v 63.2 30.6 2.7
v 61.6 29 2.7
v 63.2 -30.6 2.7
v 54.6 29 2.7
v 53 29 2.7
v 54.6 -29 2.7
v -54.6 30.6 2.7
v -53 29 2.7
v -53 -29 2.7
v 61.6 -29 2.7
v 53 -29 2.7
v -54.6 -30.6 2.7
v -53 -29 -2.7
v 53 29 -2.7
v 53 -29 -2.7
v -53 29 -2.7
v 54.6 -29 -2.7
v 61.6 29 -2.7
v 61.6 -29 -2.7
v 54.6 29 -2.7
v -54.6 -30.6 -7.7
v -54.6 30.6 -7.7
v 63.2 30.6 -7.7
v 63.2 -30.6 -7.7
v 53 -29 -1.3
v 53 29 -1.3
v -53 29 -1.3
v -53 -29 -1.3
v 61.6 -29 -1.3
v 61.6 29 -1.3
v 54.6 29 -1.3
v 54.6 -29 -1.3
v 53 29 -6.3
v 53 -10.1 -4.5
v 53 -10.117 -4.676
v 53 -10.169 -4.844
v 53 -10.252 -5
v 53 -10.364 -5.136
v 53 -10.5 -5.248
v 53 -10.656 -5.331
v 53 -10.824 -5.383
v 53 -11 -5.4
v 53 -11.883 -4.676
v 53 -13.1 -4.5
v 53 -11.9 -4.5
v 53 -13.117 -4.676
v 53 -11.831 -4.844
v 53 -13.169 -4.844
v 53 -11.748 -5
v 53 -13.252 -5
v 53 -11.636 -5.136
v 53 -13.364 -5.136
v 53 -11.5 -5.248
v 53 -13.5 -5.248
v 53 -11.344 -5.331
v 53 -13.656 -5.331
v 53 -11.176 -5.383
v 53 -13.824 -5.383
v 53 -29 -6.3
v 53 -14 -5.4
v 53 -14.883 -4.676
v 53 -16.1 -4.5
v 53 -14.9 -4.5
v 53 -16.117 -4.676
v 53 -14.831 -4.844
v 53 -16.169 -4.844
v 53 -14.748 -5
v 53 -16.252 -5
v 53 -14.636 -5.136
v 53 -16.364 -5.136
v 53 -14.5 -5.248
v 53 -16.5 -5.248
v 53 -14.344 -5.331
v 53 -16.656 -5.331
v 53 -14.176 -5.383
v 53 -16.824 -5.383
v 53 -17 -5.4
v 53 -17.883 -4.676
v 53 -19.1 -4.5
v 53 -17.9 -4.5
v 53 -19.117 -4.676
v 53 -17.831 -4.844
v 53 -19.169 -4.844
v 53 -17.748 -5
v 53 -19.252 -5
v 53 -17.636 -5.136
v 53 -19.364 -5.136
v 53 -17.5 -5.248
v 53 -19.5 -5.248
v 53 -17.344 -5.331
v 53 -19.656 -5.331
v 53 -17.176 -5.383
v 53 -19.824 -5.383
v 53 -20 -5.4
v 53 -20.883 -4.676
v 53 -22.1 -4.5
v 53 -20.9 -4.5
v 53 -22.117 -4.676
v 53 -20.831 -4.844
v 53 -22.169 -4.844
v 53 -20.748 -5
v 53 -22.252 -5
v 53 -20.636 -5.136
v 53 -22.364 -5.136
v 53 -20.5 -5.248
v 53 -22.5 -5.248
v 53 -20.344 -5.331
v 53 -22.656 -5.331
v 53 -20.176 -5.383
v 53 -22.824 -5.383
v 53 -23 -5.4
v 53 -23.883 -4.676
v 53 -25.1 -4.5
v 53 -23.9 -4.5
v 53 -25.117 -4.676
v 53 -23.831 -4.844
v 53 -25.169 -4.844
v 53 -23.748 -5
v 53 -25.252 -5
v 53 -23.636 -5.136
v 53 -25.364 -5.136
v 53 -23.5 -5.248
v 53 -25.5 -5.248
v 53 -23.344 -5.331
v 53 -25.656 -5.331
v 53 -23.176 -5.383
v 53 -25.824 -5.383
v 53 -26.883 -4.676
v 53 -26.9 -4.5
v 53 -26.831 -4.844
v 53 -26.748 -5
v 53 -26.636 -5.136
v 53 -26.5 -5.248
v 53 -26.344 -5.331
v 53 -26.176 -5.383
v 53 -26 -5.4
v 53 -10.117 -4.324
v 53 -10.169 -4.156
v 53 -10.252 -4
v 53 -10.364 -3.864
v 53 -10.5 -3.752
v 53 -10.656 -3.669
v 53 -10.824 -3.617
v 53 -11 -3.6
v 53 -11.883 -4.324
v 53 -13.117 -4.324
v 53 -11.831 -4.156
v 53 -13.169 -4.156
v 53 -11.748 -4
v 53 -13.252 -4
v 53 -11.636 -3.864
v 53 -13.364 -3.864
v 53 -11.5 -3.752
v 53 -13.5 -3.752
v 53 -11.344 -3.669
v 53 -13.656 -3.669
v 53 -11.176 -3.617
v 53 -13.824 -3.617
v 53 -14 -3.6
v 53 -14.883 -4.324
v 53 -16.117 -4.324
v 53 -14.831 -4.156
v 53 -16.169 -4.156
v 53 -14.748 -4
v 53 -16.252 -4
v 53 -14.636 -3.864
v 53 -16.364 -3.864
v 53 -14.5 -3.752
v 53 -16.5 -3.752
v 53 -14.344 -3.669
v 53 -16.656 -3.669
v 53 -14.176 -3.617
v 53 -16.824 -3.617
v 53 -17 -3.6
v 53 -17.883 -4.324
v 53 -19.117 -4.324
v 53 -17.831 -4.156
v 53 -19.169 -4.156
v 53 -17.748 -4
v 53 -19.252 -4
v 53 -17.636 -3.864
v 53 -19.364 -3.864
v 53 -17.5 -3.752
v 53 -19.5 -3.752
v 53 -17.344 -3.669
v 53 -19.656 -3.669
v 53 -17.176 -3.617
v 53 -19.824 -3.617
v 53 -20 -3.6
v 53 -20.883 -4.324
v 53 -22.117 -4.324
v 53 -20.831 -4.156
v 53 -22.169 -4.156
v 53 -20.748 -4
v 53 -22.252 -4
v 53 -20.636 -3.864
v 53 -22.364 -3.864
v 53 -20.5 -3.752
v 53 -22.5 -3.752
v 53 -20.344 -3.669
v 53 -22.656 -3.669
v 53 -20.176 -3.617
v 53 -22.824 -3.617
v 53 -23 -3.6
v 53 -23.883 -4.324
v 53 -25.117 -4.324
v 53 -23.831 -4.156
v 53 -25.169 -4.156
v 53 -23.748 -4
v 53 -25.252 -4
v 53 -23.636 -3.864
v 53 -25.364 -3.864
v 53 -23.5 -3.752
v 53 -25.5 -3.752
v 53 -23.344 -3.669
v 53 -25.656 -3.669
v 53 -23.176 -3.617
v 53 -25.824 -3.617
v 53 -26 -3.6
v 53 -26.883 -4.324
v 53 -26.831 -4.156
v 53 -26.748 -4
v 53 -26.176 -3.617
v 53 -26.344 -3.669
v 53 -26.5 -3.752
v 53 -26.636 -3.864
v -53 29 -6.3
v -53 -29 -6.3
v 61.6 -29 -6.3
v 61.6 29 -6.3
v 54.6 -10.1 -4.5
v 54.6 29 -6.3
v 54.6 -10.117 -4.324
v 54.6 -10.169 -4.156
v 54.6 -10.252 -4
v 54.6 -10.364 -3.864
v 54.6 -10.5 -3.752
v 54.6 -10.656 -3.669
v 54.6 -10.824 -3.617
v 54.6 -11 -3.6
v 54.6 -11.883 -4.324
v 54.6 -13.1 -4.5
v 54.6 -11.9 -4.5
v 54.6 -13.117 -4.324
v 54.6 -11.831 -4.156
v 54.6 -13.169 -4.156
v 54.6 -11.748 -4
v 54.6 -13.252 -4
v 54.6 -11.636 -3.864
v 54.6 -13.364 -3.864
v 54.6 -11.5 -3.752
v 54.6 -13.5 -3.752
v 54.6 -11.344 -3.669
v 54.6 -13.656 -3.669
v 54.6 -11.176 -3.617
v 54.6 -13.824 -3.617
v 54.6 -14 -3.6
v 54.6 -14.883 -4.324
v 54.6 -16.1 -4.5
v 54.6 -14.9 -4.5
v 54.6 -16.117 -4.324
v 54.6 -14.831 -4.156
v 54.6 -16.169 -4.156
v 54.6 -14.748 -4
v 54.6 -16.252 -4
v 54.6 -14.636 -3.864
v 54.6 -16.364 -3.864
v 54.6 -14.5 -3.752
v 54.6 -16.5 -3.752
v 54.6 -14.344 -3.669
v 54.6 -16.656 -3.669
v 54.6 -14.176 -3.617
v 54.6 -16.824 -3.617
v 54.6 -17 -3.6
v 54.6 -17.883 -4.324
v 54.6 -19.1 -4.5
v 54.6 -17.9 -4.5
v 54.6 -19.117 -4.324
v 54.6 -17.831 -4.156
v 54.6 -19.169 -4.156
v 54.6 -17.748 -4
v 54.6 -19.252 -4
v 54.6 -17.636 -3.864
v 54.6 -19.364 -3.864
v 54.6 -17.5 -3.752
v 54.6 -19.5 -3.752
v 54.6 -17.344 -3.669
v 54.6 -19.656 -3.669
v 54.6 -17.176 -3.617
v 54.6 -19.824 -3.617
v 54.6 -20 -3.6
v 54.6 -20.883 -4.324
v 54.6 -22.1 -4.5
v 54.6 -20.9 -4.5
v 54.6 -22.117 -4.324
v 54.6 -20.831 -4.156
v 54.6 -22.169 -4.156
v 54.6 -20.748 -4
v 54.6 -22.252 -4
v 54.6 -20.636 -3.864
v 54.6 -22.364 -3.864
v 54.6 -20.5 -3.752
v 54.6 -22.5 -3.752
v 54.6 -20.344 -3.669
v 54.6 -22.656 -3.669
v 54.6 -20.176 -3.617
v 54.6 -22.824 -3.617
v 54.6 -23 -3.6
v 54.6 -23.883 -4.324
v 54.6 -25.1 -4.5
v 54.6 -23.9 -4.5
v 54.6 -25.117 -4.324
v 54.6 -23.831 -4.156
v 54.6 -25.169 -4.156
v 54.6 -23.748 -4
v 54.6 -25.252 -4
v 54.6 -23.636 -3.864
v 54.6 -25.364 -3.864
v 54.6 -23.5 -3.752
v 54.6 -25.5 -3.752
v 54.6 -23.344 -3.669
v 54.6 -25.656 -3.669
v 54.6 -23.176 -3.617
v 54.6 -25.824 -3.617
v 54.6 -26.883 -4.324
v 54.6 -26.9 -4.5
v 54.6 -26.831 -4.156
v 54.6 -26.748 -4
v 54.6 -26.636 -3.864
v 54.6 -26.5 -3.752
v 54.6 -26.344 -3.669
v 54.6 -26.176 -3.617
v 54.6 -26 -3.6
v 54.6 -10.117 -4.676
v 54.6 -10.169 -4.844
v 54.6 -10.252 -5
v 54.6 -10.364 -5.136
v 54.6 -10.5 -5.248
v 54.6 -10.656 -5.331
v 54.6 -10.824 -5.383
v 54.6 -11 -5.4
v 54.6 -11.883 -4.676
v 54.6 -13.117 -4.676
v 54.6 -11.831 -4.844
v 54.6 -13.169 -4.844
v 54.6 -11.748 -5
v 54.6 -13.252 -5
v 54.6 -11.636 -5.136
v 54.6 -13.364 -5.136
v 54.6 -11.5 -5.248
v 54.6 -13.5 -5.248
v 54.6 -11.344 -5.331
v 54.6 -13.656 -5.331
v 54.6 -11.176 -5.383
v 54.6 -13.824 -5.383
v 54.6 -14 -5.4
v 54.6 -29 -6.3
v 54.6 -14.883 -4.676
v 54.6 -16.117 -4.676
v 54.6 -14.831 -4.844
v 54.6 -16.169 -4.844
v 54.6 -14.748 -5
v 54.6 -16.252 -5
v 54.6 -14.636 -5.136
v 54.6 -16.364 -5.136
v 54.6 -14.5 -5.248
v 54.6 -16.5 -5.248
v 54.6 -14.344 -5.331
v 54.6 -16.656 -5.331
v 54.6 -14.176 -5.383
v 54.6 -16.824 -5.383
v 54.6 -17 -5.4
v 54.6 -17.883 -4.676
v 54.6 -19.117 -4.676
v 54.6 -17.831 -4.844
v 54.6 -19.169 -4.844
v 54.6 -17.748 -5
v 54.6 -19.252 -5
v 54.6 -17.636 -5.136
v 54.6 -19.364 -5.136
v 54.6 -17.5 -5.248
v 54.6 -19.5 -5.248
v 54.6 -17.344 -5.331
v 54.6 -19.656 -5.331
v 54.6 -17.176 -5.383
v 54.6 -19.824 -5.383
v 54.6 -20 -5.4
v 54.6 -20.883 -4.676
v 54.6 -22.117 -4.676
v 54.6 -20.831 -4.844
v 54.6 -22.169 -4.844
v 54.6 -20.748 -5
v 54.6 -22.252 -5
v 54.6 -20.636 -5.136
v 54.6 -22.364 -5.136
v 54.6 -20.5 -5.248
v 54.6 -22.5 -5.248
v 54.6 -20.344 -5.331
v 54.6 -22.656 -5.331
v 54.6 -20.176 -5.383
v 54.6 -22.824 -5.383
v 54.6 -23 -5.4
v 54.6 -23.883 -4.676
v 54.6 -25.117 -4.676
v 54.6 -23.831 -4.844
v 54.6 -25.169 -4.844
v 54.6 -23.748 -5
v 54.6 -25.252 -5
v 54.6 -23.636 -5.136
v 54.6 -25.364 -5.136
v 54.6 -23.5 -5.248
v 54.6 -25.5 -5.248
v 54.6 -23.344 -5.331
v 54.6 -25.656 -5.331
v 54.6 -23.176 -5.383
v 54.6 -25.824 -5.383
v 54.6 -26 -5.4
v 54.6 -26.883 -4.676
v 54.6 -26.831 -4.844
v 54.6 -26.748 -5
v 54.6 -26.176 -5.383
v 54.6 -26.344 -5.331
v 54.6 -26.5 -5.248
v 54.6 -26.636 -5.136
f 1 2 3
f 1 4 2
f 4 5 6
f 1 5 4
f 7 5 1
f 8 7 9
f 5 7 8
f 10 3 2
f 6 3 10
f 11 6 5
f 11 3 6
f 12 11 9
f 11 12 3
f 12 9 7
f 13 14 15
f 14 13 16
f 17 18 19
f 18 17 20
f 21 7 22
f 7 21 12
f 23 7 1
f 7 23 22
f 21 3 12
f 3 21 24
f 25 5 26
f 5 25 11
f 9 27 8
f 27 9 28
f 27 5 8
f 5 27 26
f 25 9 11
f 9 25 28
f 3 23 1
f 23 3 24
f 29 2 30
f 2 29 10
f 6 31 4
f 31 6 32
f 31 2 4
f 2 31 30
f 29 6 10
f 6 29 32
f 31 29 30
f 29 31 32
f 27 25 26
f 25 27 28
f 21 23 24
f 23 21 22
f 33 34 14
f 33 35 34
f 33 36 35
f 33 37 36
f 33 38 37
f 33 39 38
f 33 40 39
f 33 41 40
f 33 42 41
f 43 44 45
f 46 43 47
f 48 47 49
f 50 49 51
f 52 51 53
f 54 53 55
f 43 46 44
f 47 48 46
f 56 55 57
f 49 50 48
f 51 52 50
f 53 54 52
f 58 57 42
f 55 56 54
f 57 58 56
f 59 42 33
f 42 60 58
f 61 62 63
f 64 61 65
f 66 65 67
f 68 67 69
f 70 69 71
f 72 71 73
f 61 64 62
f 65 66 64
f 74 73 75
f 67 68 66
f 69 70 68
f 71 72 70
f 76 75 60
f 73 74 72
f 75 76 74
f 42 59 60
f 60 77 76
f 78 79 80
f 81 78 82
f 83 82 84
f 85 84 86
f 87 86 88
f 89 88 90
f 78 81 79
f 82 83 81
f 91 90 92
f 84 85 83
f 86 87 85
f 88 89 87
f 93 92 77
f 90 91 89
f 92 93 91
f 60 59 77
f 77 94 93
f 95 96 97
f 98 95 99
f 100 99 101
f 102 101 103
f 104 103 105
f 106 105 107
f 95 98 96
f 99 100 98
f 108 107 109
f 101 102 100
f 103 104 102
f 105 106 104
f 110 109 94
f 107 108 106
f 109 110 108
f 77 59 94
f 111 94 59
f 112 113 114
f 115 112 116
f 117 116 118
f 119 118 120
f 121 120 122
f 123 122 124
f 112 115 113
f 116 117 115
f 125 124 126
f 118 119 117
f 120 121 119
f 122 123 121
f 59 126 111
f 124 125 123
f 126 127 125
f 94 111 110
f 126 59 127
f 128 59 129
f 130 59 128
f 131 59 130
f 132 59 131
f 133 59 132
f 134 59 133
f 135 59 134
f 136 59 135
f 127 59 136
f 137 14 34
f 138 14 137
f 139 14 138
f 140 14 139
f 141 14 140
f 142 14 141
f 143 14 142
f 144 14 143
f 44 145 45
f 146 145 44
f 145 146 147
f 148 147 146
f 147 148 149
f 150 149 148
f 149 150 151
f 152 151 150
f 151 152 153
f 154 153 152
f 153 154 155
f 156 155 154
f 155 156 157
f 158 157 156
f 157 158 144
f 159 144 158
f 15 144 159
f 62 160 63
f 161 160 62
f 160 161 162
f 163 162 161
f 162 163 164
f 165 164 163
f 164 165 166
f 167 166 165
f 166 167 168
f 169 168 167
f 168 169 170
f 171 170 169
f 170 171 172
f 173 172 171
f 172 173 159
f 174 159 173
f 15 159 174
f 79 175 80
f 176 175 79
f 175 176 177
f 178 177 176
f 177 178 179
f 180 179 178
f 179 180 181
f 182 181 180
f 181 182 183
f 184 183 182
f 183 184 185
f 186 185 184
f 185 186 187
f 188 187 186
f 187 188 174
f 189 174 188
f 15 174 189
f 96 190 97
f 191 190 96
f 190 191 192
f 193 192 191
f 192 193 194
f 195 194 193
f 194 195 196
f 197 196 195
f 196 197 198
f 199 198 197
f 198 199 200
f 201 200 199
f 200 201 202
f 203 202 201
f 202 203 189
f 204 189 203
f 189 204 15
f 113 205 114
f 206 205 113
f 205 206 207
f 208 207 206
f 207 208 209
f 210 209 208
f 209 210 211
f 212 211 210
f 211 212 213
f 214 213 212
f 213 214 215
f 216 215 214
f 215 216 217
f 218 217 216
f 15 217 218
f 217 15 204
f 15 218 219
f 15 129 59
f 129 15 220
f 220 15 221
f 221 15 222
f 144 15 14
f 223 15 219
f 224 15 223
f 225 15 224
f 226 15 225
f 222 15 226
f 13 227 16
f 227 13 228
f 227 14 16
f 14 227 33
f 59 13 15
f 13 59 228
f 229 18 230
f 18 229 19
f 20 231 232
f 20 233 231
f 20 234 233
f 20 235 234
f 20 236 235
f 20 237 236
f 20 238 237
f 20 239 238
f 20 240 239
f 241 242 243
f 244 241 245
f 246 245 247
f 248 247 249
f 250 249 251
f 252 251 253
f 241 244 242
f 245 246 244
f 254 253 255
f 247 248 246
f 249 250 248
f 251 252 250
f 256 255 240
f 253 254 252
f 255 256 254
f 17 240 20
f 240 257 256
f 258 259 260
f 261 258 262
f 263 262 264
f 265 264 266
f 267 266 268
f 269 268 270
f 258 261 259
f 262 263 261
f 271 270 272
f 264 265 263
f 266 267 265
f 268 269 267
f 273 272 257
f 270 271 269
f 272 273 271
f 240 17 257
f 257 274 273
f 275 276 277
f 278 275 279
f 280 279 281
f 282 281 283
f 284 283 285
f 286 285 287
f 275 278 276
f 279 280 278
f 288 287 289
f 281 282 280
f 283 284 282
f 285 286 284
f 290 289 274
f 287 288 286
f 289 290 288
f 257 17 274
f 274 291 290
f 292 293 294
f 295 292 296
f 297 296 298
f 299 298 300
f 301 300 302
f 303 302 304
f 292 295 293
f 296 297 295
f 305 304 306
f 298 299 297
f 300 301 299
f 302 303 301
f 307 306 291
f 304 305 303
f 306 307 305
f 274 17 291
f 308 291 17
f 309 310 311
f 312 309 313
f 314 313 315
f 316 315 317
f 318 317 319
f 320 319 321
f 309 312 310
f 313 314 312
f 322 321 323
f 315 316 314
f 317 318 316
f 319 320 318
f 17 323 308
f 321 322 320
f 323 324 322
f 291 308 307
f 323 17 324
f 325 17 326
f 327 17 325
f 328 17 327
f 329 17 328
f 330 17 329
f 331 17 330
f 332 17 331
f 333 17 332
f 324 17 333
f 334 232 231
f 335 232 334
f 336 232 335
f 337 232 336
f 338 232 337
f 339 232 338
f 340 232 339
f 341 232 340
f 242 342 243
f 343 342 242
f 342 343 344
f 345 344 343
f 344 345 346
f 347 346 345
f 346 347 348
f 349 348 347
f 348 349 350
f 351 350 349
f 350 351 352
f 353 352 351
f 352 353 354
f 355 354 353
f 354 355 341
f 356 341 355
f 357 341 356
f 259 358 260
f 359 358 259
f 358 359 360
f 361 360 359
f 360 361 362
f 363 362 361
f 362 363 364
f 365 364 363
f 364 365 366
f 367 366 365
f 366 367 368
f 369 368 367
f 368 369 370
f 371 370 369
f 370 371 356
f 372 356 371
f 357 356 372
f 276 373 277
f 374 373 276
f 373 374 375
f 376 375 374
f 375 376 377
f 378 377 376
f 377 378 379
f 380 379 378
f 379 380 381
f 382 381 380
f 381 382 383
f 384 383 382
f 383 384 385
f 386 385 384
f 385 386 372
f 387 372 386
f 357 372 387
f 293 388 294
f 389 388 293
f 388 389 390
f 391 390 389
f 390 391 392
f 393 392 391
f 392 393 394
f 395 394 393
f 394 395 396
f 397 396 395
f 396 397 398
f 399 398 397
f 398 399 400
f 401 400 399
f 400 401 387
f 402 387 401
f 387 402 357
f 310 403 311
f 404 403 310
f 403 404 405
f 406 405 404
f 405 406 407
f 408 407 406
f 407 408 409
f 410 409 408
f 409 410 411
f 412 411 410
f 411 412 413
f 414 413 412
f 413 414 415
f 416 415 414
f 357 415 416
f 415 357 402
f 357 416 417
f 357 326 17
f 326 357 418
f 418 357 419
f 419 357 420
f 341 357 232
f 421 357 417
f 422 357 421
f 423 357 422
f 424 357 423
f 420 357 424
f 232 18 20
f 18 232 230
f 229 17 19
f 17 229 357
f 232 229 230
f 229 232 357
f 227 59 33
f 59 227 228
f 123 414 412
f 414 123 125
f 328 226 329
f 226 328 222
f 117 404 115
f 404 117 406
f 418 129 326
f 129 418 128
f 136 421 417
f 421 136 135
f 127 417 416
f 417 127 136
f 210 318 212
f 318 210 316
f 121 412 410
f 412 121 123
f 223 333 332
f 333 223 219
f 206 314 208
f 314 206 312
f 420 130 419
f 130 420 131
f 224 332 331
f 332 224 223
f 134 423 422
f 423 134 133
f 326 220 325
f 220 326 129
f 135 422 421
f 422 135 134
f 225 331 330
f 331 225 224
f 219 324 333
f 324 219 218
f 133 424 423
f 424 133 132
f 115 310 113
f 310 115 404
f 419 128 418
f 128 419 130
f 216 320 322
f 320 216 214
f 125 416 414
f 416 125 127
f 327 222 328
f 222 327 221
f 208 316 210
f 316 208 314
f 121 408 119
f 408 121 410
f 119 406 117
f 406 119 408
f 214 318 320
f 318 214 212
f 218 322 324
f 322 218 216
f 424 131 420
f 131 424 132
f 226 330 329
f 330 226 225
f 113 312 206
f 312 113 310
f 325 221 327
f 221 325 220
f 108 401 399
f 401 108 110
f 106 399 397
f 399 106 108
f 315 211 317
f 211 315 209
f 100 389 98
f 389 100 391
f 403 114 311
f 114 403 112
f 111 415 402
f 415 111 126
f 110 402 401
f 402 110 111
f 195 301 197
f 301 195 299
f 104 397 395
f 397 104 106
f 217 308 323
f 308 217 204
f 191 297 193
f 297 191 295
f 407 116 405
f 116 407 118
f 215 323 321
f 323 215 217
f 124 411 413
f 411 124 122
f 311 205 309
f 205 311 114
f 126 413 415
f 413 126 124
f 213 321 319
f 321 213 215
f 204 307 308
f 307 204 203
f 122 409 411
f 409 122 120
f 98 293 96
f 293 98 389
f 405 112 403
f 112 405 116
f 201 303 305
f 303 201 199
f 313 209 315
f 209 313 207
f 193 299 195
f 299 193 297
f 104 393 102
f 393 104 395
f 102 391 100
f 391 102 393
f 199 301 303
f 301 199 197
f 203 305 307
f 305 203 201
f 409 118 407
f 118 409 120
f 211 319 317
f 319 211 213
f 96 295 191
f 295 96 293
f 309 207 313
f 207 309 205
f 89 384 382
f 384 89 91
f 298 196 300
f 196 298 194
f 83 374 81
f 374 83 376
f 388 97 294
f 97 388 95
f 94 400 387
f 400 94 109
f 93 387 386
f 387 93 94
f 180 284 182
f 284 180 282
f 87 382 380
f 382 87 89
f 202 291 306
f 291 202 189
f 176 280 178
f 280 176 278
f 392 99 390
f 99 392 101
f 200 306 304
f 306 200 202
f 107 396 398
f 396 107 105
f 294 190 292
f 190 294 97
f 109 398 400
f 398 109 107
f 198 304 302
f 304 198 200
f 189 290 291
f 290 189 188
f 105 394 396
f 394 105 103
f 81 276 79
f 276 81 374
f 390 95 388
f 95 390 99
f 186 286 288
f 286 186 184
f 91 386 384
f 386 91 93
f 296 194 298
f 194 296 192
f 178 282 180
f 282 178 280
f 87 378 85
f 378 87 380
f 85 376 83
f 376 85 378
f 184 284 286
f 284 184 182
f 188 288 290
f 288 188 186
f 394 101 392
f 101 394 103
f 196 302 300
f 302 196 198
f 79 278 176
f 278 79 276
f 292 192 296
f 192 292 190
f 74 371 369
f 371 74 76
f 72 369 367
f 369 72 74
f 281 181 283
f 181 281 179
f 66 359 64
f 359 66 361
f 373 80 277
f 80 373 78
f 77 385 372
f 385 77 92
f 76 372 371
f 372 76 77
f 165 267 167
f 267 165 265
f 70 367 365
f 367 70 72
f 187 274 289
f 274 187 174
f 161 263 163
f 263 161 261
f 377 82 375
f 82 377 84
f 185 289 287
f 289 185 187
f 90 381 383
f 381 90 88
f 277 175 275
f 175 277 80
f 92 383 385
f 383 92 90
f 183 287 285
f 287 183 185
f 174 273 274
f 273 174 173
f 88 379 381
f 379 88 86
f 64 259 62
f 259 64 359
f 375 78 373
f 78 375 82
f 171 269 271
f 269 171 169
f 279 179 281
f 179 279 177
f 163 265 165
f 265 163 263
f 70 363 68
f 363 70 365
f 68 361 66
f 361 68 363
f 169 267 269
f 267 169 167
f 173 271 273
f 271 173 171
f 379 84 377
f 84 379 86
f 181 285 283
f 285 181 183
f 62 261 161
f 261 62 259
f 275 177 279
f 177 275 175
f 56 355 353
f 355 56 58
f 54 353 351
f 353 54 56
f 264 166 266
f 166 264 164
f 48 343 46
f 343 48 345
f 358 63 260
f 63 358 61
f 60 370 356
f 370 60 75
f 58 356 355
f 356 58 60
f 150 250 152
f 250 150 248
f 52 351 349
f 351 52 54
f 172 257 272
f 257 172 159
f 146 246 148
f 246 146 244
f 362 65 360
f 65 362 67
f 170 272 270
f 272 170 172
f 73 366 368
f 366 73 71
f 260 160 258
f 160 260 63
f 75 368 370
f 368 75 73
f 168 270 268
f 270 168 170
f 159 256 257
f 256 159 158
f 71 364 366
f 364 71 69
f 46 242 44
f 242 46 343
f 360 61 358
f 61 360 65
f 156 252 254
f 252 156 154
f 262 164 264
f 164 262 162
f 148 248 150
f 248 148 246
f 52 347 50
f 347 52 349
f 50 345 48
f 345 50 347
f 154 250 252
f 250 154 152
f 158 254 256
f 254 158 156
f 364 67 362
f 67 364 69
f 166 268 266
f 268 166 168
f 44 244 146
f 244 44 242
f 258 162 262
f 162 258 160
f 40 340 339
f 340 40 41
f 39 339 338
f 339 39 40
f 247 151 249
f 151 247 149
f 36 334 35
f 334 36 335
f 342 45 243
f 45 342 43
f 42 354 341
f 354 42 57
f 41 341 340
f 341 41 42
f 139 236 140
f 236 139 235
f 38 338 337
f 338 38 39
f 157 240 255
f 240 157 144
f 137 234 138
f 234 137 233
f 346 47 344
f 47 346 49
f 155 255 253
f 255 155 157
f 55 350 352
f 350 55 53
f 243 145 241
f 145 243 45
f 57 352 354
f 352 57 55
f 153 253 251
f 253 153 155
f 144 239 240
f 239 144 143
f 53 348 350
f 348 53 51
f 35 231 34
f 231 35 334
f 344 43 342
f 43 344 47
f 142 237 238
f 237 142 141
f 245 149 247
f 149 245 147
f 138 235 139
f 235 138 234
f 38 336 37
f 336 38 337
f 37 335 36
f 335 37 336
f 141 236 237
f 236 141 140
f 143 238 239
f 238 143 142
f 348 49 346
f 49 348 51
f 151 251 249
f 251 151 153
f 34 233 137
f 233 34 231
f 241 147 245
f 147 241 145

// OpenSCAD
len_bottom = 106;
depth_bottom = 58;
thickness_walls = 1.6;
// screen backlight panel
// height of frame without thickness bottom
height_frame = 4;
thickness_bottom = 1.4;
depth_pcb = 7; 

// window_frame();

translate([0, 0, -5])
kit_frame();
set_frame();
// frame_is_match();

module window_frame() {
  difference() {
    color("green")
    cube([len_bottom, depth_bottom, height_frame], true);
    cube([len_bottom-10, depth_bottom-4, height_frame+1], true);
    translate([len_bottom/2-1, 0, 0])
    cube([4, depth_bottom-4, height_frame+1], true);
    translate([-len_bottom/2+4, 0, 0])
    cube([4, depth_bottom-4, height_frame+1], true);
  }
}

module kit_frame() {
  difference() {
    set_frame();
    for(i=[1:6]){
      translate([len_bottom/2, -depth_bottom/2+3*i, 0.5])
      rotate([0, 90, 0])
      cylinder(d=1.8, h=5, center=true, $fn=32);
    }

  }  
}

module set_frame() {
  color("lime")
  translate([0, 0, -height_frame/2])
  bottom();
  frame();
  translate([len_bottom/2+depth_pcb/2+thickness_walls, 0, 0])
  set_frame_pcb();
}

module set_frame_pcb() {
  color("lime")
  translate([0, 0, -height_frame/2])
  bottom_pcb();
  frame_pcb();
}

module bottom_pcb() {
  cube([depth_pcb+2*thickness_walls, depth_bottom+2*thickness_walls, thickness_bottom], true);
}

module frame_pcb() {
  difference() {
    cube([depth_pcb+2*thickness_walls, depth_bottom+2*thickness_walls, thickness_bottom+height_frame], true);
    color("red")
    cube([depth_pcb, depth_bottom, thickness_bottom+height_frame+0.1], true);
  }
}

module bottom() {
  cube([len_bottom+2*thickness_walls, depth_bottom+2*thickness_walls, thickness_bottom], true);
}

module frame() {
  difference() {
    cube([len_bottom+2*thickness_walls, depth_bottom+2*thickness_walls, thickness_bottom+height_frame], true);
    color("red")
    cube([len_bottom, depth_bottom, thickness_bottom+height_frame+0.1], true);
  }
}

module frame_is_match() {
  difference() {
    set_frame();
    // cut is match
    translate([106/4, 0, 0])
    cube([106/2+4, 58+4, 4*2], true);
  }
  // is match wall
  translate([0, depth_bottom/2+thickness_walls/2, 0])
  cube([5, thickness_walls, thickness_bottom+height_frame], true);

  // is match bottom
  translate([0, depth_bottom/2-4, -height_frame/2])
  cube([5, 5, thickness_bottom], true);
}
